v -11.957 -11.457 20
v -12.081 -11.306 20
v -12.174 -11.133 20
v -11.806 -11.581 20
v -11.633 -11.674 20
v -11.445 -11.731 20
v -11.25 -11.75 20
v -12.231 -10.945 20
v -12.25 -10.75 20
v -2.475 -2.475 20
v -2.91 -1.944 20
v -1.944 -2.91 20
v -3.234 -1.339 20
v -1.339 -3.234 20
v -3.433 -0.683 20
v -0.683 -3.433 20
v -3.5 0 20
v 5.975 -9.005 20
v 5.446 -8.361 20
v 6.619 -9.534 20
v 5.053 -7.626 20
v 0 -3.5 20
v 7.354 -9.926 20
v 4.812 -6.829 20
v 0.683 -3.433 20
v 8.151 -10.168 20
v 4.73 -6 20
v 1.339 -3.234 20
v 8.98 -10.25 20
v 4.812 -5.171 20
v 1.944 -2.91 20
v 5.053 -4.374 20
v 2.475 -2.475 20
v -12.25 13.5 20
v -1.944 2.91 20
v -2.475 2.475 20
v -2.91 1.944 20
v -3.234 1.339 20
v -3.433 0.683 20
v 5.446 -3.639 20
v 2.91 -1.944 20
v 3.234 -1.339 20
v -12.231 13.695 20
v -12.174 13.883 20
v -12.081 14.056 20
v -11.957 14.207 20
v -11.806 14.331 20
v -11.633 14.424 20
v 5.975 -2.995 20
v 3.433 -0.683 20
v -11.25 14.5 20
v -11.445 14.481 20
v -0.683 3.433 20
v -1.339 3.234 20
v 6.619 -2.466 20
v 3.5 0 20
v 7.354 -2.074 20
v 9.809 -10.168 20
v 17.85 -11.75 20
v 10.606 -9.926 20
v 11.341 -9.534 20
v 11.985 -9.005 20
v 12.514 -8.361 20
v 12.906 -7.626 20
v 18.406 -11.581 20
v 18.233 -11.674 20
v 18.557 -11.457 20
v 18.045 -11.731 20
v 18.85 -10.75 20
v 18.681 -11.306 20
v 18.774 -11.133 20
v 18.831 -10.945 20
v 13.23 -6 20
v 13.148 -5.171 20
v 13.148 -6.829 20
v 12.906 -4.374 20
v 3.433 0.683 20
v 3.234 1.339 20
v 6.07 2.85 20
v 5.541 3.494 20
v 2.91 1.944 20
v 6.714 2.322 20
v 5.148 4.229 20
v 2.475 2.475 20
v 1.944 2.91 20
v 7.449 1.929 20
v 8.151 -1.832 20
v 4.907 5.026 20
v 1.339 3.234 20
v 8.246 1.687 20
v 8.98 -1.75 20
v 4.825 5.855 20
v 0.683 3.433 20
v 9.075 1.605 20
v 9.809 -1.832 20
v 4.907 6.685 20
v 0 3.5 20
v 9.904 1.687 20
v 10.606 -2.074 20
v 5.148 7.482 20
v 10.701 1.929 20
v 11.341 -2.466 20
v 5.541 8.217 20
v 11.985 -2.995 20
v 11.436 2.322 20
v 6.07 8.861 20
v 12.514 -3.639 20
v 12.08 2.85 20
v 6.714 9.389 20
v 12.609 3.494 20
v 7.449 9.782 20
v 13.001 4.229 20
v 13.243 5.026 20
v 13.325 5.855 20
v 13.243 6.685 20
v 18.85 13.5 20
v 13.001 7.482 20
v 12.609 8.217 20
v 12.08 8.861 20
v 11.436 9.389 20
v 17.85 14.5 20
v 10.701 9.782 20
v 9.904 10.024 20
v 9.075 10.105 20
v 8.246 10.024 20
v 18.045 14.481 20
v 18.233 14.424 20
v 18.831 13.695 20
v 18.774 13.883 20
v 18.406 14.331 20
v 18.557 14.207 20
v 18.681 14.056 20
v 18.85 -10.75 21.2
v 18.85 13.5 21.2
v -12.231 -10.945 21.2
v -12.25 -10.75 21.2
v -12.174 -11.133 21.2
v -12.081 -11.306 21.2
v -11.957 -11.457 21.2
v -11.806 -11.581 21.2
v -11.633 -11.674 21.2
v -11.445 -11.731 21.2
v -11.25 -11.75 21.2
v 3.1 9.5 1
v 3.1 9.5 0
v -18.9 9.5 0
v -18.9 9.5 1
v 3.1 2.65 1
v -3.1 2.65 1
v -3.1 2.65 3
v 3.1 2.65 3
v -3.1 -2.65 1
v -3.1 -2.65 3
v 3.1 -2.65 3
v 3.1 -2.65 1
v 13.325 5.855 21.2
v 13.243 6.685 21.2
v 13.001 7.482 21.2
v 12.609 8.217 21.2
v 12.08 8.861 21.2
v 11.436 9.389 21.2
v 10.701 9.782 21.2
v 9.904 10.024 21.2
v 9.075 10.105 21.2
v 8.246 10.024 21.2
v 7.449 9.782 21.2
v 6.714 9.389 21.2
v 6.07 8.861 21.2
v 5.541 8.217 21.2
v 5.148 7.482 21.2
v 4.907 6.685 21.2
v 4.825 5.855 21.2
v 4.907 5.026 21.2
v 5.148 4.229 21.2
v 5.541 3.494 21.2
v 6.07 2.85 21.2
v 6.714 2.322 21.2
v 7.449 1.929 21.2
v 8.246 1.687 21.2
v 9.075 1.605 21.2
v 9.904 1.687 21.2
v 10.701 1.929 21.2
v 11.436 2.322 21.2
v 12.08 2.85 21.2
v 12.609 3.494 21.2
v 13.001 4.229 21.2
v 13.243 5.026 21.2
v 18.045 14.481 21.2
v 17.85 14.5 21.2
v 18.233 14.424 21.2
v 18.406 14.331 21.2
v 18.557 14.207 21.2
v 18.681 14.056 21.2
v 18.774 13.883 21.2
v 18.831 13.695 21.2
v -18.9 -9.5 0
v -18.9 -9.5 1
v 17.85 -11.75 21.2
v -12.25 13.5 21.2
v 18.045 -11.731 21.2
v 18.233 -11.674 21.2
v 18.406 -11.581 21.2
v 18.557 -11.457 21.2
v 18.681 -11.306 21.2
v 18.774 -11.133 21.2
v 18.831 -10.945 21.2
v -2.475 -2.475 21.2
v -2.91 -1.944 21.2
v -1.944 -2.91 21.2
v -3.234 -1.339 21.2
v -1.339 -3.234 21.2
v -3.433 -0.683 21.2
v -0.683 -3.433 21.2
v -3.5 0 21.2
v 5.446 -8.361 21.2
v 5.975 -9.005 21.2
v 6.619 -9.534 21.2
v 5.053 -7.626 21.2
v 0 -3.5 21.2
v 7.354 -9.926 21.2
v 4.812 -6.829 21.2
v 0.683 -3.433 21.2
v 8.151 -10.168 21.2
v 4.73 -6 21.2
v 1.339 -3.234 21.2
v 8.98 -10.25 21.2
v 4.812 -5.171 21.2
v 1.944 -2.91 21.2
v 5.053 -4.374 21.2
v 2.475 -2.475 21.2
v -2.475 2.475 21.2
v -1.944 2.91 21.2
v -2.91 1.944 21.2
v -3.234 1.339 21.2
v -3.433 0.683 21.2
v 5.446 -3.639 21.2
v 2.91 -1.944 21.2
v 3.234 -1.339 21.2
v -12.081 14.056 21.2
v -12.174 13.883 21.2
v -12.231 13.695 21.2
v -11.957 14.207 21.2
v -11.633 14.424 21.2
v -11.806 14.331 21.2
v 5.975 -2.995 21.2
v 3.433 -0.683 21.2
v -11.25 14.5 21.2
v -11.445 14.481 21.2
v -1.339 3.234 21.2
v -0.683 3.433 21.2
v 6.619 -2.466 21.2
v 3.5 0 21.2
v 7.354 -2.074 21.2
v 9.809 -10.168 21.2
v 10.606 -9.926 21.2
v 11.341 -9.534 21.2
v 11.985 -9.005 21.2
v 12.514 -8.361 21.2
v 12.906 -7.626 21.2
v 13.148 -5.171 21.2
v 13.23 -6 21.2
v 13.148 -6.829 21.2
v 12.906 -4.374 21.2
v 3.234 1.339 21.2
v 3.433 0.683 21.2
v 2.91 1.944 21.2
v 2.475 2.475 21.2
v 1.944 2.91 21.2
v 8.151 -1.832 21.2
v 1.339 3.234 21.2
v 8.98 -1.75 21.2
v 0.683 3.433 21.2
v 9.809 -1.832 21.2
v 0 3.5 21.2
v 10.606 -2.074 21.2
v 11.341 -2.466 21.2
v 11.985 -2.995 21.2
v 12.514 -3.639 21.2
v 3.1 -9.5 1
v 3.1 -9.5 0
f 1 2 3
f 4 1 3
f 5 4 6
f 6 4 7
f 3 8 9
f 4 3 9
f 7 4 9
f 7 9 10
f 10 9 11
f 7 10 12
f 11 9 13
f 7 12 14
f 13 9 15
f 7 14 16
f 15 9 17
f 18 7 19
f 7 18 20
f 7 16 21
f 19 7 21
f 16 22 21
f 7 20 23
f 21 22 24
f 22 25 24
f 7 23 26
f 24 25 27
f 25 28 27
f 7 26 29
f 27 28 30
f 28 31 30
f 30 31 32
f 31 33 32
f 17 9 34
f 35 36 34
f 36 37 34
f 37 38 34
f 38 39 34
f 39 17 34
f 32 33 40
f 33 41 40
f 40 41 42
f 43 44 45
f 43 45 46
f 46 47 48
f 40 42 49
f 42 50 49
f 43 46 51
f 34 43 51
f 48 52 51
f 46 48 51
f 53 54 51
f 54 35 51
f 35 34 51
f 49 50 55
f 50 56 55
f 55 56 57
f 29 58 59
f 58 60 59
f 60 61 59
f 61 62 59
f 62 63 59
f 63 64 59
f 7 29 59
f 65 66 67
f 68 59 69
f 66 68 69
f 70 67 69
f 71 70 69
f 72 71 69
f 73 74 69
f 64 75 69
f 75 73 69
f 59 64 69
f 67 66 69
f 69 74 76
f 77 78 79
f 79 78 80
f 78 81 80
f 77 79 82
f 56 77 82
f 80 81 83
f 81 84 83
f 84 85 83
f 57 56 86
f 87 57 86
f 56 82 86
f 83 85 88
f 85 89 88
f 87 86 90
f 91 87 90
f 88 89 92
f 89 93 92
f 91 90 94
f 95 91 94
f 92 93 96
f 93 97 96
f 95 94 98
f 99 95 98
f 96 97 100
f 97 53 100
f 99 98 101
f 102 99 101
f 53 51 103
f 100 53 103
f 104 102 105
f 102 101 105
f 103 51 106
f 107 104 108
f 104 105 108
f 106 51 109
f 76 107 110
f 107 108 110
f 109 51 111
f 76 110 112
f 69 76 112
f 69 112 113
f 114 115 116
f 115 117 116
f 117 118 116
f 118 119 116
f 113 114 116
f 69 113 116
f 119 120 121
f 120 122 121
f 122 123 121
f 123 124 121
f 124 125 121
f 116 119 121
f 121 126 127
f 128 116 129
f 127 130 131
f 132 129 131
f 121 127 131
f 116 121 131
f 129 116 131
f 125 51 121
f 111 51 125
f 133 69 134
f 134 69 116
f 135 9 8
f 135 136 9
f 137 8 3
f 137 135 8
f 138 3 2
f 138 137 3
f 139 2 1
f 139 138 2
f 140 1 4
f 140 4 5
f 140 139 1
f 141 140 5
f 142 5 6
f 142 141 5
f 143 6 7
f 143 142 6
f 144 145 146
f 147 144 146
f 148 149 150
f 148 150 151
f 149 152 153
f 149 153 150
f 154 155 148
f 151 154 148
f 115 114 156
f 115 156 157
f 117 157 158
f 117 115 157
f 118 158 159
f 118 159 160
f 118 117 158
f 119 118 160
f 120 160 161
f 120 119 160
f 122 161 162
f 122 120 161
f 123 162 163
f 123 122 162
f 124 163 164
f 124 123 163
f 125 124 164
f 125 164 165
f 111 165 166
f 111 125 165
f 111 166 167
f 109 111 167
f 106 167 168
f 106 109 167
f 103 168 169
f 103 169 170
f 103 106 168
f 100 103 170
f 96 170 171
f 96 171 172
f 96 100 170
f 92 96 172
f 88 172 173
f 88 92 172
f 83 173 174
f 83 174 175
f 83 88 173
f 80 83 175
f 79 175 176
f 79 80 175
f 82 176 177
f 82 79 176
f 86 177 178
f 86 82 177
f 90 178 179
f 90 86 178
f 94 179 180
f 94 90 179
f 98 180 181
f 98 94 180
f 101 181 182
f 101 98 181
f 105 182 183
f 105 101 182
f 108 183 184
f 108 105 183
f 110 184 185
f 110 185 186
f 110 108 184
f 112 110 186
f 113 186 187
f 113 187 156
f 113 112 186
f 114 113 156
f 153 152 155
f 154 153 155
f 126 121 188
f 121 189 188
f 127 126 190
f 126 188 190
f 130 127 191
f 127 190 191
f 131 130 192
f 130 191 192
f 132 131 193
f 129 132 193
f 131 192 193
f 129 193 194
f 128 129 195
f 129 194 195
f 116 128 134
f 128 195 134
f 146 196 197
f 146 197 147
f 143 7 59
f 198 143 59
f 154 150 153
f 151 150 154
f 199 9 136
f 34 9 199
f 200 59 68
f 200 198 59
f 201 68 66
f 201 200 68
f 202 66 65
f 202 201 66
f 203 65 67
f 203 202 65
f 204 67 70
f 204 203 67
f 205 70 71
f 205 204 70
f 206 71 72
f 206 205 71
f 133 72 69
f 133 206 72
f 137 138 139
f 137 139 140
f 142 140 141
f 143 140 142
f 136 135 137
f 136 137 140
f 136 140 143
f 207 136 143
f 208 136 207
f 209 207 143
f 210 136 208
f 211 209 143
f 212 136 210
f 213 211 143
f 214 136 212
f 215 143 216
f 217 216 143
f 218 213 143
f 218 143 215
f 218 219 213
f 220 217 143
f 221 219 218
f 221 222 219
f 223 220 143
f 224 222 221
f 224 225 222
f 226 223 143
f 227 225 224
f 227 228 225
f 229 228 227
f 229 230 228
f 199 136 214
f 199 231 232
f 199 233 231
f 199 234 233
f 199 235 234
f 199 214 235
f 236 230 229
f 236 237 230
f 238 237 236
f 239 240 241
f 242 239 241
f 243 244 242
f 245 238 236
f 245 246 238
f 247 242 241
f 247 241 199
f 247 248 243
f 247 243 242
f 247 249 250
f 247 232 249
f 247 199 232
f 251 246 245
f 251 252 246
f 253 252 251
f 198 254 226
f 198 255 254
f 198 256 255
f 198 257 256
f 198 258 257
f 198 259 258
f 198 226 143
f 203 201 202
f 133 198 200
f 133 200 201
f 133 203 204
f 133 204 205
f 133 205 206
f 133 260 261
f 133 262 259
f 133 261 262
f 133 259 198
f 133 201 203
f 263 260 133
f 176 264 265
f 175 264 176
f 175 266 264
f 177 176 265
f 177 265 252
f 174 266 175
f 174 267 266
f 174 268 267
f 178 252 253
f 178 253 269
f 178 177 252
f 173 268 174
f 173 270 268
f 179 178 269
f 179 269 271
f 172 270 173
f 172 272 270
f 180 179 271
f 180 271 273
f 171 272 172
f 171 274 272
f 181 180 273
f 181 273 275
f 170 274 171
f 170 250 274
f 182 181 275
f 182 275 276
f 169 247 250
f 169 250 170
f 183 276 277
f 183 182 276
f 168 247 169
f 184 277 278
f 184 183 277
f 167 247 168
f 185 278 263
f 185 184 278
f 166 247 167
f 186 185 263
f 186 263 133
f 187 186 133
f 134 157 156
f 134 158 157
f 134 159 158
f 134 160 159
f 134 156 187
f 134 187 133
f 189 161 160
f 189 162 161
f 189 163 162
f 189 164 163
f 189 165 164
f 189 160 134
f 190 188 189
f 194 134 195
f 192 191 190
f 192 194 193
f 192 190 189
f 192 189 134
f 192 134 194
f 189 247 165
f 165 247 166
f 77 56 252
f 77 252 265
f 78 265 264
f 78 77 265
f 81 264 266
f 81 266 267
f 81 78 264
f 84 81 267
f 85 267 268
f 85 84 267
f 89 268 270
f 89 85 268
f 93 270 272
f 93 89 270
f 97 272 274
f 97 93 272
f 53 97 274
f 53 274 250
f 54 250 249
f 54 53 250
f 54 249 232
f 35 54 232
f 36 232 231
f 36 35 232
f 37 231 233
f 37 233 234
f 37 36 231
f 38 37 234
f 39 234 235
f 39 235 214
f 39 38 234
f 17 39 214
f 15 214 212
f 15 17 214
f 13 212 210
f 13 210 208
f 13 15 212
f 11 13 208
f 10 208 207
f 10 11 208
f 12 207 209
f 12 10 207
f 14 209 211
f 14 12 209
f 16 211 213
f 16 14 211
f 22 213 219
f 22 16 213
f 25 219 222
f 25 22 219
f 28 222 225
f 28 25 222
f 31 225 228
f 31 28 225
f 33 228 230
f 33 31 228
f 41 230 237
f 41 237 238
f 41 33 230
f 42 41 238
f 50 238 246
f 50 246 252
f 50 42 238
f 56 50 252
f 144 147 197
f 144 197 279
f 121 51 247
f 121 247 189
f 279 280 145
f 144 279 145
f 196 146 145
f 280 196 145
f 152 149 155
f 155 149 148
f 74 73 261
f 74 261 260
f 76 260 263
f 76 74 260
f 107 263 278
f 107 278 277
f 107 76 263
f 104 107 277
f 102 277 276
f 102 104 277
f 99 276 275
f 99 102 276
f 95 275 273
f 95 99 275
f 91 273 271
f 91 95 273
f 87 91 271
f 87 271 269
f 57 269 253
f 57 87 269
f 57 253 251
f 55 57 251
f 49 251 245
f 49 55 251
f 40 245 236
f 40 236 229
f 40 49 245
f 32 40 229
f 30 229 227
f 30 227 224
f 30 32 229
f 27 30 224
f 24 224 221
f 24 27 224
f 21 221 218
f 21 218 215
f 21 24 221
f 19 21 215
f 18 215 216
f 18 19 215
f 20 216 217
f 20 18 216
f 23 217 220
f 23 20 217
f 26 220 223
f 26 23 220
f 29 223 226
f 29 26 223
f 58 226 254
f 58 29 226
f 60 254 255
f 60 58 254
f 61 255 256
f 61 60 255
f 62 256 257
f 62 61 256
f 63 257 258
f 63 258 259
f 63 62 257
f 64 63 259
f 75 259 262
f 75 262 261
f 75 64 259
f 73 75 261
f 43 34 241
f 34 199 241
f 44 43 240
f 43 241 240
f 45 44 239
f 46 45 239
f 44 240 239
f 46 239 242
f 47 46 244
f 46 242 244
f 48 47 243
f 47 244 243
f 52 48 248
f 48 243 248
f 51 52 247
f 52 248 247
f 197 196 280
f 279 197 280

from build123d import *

# Parameters (mm, degrees)
F5_W     = 31.1
F5_H     = 26.24999962
F5_R     = 3.5
F5_R_2   = 4.25
F6_DEPTH = 1.2
F7_R     = 1
F1_W     = 6.65
F1_H     = 19
F1_W_2   = 6.2
F1_H_2   = 5.3
F8_DEPTH = 1
F9_START = 1
F9_DEPTH = 2


with BuildPart() as f6:
    # F5 (on offset) → F6 (new body)
    with BuildSketch(Plane.XY.offset(20)):
        with Locations((3.3, 1.37499981)):
            Rectangle(F5_W, F5_H)
        Circle(F5_R, mode=Mode.SUBTRACT)
        with Locations((8.9799777283, -6)):
            Circle(F5_R_2, mode=Mode.SUBTRACT)
        with Locations((9.074924206, 5.8554035433)):
            Circle(F5_R_2, mode=Mode.SUBTRACT)
    extrude(amount=F6_DEPTH)

    # F7
    f7_edges = [f6.edges().sort_by_distance(p)[0] for p in [
        (-12.25, 14.5, 20.6),
        (-12.25, -11.75, 20.6),
        (18.85, 14.5, 20.6),
        (18.85, -11.75, 20.6),
    ]]
    fillet(f7_edges, radius=F7_R)


with BuildPart() as f8:
    # F1 (on Top) → F8 (new body)
    with BuildSketch(Plane.XY):
        with Locations((-15.575, 0)):
            Rectangle(F1_W, F1_H)
        Rectangle(F1_W_2, F1_H_2)
        Polygon((3.1, -9.5), (3.1, -2.65), (-3.1, -2.65), (-3.1, 2.65), (3.1, 2.65), (3.1, 9.5), (-12.25, 9.5), (-12.25, -9.5), align=None)
    extrude(amount=F8_DEPTH)


with BuildPart() as f9:
    # F1 (on Top) → F9 (new body)
    with BuildSketch(Plane.XY.offset(F9_START)):
        Rectangle(F1_W_2, F1_H_2)
    extrude(amount=F9_DEPTH)


solid = Compound([f6.part, f8.part, f9.part])
